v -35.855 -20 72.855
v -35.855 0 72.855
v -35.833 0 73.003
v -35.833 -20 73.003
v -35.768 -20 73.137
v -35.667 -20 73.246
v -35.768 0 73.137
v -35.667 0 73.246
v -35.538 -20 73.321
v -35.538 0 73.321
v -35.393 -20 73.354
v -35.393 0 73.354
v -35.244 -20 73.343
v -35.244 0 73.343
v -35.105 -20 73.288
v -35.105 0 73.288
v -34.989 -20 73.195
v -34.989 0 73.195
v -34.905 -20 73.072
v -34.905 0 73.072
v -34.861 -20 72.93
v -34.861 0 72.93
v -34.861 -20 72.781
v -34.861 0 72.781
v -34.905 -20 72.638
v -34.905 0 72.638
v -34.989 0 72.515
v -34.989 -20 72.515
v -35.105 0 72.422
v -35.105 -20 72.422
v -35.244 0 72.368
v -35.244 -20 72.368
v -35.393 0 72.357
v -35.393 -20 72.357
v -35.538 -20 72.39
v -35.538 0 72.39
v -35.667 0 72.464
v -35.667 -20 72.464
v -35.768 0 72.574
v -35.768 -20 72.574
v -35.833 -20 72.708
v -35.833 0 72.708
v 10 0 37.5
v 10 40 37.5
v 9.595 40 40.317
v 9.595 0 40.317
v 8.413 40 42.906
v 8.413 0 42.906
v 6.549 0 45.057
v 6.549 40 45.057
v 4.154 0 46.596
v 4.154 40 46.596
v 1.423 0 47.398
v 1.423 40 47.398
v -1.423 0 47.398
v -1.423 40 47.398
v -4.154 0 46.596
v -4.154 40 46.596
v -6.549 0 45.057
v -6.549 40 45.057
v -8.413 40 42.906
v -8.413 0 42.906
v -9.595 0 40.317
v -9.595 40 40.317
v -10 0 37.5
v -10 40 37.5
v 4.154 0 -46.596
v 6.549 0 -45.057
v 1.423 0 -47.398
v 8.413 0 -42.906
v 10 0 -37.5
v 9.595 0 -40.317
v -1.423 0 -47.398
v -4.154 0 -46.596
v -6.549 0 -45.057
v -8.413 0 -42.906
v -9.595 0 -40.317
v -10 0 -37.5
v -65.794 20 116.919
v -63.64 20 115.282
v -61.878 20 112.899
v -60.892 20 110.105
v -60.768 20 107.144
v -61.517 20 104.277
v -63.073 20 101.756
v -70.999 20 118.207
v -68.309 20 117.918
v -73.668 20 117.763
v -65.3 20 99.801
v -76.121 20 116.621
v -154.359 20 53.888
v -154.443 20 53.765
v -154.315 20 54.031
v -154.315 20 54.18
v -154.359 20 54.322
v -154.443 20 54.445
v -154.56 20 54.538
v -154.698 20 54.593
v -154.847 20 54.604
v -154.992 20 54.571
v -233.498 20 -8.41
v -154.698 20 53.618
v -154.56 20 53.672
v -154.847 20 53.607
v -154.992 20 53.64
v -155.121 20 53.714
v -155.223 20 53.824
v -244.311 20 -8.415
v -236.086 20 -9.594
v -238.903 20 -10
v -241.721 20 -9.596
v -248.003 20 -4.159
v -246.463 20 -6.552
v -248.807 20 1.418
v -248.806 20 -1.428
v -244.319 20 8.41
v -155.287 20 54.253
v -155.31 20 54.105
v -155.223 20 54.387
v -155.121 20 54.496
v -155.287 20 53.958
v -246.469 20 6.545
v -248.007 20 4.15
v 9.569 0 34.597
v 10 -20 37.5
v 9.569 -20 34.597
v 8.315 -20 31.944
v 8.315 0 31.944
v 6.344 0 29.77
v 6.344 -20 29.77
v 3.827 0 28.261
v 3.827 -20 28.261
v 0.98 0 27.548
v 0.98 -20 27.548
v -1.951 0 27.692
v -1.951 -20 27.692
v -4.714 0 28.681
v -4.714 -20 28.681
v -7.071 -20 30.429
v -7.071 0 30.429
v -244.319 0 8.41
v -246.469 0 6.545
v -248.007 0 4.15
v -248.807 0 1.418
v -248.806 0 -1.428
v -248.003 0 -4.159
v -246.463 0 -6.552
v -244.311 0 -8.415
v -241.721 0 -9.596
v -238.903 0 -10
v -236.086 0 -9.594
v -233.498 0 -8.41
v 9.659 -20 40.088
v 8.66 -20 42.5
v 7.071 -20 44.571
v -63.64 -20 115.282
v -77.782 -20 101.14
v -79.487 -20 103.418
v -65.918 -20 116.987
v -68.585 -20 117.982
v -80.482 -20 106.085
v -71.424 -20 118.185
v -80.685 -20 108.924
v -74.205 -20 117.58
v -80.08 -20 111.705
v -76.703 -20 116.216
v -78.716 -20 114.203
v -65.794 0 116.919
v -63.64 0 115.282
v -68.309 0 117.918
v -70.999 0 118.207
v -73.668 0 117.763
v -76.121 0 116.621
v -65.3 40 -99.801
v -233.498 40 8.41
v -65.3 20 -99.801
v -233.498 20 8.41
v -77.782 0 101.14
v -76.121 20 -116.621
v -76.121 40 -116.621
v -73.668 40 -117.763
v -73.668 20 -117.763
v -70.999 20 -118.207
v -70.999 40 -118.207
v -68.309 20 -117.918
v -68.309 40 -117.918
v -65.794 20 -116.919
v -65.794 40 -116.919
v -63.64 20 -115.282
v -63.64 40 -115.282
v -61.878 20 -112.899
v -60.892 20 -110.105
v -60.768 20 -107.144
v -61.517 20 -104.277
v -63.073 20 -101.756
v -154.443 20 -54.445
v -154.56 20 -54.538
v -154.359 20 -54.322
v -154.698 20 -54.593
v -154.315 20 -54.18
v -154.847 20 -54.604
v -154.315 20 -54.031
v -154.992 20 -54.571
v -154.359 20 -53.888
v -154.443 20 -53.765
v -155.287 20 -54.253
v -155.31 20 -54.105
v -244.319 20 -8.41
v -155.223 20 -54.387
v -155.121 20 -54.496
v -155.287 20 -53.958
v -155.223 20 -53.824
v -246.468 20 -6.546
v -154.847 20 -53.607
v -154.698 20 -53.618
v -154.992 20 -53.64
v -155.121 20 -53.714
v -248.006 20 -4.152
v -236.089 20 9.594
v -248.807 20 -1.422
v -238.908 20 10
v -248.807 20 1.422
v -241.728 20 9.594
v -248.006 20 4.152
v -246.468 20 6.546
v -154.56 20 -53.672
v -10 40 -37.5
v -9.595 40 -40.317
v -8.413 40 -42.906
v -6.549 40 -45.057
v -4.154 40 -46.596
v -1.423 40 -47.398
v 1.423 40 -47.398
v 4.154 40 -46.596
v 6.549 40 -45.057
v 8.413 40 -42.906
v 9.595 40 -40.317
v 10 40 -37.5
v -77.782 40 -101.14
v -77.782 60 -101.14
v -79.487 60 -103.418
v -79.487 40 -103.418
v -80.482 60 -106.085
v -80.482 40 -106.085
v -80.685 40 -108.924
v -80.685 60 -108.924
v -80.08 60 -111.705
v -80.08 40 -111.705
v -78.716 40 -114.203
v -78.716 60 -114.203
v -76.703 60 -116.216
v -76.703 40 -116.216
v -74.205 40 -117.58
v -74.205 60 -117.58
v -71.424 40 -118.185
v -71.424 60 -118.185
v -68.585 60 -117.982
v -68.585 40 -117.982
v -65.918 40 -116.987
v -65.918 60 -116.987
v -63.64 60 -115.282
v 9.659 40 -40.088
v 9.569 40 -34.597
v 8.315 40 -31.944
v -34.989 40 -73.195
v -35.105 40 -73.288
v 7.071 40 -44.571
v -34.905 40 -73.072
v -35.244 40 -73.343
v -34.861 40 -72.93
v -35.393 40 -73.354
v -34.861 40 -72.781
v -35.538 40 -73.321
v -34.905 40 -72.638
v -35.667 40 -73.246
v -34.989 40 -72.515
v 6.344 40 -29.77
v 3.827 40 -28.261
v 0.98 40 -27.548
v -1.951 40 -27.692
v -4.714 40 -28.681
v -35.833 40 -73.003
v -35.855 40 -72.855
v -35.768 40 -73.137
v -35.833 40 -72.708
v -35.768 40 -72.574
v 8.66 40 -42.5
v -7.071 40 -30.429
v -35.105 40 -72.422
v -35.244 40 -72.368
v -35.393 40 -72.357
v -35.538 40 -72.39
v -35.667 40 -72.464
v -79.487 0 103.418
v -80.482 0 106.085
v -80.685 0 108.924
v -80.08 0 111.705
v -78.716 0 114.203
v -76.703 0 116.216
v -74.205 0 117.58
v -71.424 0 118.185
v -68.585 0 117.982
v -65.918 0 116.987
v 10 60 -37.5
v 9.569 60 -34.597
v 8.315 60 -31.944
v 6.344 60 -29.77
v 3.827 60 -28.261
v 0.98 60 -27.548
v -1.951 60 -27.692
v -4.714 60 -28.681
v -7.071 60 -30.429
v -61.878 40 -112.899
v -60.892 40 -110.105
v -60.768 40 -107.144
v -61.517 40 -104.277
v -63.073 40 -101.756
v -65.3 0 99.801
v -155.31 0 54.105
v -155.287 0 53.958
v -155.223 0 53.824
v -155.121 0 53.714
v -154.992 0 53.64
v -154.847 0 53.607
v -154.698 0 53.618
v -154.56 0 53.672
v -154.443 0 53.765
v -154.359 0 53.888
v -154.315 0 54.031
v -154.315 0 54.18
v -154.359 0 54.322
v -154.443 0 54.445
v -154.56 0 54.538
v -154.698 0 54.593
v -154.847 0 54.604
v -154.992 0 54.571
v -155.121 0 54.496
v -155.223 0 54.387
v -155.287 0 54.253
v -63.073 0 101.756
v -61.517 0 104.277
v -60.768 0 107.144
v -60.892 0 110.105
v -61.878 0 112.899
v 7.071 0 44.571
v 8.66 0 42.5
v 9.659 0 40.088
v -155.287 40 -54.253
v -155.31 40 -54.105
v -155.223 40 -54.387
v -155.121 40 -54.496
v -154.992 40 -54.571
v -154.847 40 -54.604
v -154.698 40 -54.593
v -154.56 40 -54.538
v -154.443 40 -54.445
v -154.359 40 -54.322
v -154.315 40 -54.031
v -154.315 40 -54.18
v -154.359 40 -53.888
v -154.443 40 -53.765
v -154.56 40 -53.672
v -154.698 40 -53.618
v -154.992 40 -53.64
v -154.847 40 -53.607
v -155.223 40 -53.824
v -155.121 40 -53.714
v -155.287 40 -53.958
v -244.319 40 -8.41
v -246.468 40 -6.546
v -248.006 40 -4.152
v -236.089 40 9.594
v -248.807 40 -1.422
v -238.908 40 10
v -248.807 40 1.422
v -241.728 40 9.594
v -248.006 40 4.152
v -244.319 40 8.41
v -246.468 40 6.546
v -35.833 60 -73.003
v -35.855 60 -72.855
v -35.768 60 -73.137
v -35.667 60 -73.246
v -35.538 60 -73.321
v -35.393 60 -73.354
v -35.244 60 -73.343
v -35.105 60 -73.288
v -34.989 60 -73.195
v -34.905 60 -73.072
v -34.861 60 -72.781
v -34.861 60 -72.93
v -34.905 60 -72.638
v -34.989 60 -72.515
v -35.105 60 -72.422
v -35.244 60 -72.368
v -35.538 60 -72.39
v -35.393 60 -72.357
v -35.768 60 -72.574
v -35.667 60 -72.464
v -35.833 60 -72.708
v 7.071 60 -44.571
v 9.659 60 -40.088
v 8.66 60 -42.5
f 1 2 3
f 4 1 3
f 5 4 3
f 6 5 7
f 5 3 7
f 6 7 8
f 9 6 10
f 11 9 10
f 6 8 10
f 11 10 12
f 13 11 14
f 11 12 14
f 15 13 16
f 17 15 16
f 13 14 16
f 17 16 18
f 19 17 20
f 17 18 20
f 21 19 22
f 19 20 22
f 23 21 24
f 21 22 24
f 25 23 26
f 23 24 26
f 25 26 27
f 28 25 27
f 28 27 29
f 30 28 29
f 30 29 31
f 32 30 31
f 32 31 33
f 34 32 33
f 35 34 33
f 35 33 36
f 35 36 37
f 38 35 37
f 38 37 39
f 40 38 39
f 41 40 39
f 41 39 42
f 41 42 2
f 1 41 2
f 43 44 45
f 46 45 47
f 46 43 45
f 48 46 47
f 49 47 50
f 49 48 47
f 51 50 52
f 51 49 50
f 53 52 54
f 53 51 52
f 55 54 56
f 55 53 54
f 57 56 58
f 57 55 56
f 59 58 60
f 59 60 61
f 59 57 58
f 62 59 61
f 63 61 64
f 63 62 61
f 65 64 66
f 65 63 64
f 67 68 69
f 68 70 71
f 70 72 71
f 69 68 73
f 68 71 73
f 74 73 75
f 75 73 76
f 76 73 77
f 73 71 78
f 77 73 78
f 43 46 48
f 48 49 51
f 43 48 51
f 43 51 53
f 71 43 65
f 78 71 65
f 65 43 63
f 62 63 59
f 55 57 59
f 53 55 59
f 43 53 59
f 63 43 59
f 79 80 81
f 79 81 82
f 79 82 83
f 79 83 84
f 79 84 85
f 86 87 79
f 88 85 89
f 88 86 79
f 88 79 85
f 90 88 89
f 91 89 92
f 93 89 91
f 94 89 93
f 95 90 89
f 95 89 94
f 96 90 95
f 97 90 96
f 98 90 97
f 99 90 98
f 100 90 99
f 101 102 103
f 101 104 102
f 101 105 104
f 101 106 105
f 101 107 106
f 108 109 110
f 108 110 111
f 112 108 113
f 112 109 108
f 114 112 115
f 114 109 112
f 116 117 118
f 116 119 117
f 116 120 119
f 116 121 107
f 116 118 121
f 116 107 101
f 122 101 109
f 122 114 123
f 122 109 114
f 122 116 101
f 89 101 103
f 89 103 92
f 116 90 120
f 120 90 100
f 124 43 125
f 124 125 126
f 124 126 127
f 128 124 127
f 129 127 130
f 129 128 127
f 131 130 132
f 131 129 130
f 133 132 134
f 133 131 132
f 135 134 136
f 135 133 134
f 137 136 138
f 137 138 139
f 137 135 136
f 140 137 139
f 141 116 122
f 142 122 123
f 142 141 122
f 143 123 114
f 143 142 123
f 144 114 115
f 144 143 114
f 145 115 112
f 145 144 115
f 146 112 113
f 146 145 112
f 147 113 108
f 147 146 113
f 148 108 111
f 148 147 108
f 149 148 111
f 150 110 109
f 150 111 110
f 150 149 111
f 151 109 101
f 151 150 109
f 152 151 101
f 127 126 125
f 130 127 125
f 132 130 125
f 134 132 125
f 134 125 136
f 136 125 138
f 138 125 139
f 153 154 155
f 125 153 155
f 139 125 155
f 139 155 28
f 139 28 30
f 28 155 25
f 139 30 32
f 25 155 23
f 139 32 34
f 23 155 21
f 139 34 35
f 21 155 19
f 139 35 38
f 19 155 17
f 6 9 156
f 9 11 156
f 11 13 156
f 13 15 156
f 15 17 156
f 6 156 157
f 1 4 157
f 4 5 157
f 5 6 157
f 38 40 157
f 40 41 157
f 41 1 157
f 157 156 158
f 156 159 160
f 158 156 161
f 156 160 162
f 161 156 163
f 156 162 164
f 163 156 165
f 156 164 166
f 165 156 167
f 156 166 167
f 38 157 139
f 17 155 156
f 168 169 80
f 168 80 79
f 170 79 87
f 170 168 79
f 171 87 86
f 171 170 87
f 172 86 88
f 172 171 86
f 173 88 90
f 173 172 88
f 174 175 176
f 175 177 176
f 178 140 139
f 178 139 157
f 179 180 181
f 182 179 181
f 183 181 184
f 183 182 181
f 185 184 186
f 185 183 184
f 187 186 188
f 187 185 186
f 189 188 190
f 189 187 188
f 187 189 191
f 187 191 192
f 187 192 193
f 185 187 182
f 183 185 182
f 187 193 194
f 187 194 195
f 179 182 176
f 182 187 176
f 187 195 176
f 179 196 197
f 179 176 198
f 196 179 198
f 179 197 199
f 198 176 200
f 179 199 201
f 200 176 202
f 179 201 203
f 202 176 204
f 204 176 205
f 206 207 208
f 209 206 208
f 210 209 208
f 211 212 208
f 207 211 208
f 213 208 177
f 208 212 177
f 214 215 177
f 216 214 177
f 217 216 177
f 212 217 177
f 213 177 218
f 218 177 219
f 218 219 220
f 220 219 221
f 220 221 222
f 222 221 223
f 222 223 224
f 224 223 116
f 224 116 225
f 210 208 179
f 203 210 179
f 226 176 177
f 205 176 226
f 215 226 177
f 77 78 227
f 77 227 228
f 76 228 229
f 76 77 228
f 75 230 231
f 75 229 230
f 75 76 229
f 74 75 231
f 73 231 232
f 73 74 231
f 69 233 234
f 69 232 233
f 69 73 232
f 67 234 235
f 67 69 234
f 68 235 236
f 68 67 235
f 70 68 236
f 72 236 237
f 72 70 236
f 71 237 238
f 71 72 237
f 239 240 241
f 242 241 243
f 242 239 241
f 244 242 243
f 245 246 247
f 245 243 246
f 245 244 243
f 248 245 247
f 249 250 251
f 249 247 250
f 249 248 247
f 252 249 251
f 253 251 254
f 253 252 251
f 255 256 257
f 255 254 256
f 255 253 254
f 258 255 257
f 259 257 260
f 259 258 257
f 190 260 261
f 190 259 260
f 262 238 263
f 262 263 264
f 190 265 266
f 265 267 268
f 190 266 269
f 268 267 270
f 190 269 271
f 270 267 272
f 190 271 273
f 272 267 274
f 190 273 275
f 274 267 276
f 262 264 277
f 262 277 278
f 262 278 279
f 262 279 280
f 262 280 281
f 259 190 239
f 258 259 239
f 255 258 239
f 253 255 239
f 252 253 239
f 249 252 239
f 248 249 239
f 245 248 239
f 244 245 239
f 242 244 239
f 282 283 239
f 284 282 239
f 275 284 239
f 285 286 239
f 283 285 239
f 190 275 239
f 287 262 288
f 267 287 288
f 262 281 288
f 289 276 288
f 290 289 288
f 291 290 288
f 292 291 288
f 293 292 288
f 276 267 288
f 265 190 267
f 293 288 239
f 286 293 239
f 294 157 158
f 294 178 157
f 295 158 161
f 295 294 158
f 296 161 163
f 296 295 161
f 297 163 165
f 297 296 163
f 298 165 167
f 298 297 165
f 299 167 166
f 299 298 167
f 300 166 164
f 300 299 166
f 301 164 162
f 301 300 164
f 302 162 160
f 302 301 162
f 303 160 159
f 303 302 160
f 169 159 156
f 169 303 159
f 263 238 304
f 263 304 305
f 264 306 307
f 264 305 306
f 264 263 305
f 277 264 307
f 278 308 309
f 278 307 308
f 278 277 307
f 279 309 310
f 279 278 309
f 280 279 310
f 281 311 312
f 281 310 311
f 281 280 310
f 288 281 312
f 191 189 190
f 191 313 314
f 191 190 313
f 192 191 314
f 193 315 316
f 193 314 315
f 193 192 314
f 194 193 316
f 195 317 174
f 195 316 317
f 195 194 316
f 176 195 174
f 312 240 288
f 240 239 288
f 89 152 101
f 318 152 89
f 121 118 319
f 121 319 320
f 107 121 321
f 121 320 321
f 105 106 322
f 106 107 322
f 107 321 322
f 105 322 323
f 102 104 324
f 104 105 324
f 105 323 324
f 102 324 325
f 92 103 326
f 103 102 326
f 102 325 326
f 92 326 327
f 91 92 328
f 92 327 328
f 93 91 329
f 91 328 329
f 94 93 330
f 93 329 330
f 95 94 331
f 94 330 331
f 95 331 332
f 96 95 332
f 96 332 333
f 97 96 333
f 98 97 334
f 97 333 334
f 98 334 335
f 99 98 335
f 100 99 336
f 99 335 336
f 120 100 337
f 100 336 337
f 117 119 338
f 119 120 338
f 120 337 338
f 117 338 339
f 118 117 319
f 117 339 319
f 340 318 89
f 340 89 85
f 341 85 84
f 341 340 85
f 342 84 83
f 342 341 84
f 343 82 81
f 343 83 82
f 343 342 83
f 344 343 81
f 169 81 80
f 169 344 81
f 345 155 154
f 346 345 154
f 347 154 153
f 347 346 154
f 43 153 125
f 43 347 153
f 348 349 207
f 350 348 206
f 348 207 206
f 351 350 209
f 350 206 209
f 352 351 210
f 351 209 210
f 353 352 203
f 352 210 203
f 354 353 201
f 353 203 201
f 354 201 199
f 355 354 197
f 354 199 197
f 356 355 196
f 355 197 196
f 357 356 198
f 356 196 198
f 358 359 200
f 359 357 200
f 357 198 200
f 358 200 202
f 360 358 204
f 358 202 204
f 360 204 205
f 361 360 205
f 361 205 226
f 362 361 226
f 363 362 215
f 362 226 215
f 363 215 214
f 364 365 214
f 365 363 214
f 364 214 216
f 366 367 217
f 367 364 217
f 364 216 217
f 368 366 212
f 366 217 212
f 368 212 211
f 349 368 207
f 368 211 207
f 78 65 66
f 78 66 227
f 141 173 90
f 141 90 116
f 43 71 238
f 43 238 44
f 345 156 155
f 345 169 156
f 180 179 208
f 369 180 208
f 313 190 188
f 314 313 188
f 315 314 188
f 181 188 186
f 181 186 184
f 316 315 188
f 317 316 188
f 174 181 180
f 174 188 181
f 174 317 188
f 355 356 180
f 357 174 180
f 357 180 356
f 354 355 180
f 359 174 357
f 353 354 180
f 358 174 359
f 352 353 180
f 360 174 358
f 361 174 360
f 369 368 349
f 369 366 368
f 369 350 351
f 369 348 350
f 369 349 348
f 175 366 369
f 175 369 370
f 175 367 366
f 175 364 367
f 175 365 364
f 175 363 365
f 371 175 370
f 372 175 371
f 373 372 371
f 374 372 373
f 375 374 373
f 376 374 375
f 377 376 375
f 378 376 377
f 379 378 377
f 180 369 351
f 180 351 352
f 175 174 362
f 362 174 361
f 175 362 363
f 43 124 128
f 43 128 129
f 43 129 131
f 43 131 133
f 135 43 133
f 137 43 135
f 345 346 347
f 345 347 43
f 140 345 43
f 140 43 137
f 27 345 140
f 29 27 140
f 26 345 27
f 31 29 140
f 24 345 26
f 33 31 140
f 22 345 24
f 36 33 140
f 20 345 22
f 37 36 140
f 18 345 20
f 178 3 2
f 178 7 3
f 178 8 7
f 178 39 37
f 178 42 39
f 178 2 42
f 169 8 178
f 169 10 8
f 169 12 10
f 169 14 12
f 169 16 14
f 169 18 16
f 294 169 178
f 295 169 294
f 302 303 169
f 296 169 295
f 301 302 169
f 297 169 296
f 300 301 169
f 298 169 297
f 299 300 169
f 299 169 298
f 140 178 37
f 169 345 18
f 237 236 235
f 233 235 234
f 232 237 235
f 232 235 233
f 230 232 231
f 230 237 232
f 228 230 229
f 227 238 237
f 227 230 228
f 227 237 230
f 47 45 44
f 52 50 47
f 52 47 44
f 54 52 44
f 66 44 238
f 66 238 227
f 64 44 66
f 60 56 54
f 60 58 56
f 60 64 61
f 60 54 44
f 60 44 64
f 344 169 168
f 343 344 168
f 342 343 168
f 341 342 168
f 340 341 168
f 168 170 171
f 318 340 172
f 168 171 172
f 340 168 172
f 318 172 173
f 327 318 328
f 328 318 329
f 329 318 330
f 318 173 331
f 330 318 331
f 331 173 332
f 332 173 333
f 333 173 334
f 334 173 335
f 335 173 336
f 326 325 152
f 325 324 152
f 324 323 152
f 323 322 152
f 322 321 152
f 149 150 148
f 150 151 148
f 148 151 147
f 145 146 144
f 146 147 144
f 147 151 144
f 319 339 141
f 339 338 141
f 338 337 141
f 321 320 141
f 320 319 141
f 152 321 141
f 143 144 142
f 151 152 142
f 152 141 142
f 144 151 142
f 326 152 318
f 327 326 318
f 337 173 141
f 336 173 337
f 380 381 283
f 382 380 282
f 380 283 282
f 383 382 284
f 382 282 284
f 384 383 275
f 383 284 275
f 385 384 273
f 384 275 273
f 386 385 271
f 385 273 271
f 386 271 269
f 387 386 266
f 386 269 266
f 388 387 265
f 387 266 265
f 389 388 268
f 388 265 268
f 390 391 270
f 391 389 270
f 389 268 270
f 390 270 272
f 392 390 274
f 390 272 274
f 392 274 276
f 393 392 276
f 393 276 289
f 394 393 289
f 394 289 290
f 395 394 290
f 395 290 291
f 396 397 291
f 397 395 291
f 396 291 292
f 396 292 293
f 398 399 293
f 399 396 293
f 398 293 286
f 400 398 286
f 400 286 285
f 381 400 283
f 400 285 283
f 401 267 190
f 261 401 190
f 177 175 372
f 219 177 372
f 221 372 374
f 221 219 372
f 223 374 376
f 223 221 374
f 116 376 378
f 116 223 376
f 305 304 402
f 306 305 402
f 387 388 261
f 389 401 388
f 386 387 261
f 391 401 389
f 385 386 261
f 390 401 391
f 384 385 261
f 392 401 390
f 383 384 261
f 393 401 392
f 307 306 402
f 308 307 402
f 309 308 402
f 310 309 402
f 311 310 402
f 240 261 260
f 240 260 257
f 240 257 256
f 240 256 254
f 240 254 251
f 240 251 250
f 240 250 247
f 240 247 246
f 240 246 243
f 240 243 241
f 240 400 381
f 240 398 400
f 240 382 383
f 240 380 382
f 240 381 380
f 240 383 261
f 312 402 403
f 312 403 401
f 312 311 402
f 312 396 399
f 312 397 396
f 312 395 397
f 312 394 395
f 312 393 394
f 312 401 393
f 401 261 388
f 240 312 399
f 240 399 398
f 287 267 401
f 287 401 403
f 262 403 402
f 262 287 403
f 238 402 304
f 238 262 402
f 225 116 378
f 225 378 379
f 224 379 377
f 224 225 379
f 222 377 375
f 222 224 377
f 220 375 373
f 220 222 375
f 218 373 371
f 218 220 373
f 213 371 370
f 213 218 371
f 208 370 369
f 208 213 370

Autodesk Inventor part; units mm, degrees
ref_plane "YZ Plane" through (0, 0, 0) normal (1, 0, 0) x (0, 1, 0)
ref_plane "XZ Plane" through (0, 0, 0) normal (0, 1, 0) x (-1, 0, 0)
ref_plane "XY Plane" through (0, 0, 0) normal (0, 0, 1) x (1, 0, 0)
sketch "Sketch1" plane through (0, 0, 0) normal (0, 1, 0) x (-1, 0, 0)
  line L0 (1000, 500) -> (0, 500) construction
  line L1 (0, 500) -> (0, -500) construction
  line L2 (0, -500) -> (1000, -500) construction
  line L3 (1000, -500) -> (1000, 500) construction
  line L4 (0, 37.5) -> (0, -37.5) construction
  line L5 (10, 37.5) -> (10, -37.5)
  line L6 (-10, -37.5) -> (-10, 37.5)
  arc A0 (10, 37.5) -> (-10, 37.5) centre (0, 37.5) ccw
  arc A1 (-10, -37.5) -> (10, -37.5) centre (0, -37.5) ccw
  line L7 (70.7107, 108.2107) -> (0, 37.5) construction
  line L8 (63.6396, 115.2817) -> (-7.0711, 44.5711)
  line L9 (7.0711, 30.4289) -> (77.7817, 101.1396)
  arc A2 (77.7817, 101.1396) -> (63.6396, 115.2817) centre (70.7107, 108.2107) ccw
  arc A3 (-7.0711, 44.5711) -> (7.0711, 30.4289) centre (0, 37.5) ccw
  line L10 (70.7107, -108.2107) -> (0, -37.5) construction
  line L11 (77.7817, -101.1396) -> (7.0711, -30.4289)
  line L12 (-7.0711, -44.5711) -> (63.6396, -115.2817)
  arc A4 (63.6396, -115.2817) -> (77.7817, -101.1396) centre (70.7107, -108.2107) ccw
  arc A5 (7.0711, -30.4289) -> (-7.0711, -44.5711) centre (0, -37.5) ccw
  line L13 (70.7107, 108.2107) -> (238.9083, 0) construction
  line L14 (76.1212, 116.6206) -> (244.3189, 8.4099)
  line L15 (233.4978, -8.4099) -> (65.3001, 99.8008)
  arc A6 (76.1212, 116.6206) -> (65.3001, 99.8008) centre (70.7107, 108.2107) ccw
  arc A7 (233.4978, -8.4099) -> (244.3189, 8.4099) centre (238.9083, 0) ccw
  line L16 (70.7107, -108.2107) -> (238.9083, 0) construction
  line L17 (76.1212, -116.6206) -> (244.3189, -8.4099)
  line L18 (233.4978, 8.4099) -> (65.3001, -99.8008)
  arc A8 (65.3001, -99.8008) -> (76.1212, -116.6206) centre (70.7107, -108.2107) ccw
  arc A9 (244.3189, -8.4099) -> (233.4978, 8.4099) centre (238.9083, 0) ccw
  line L19 (70.7107, -108.2107) -> (70.7107, -536.9645) construction
  line L20 (70.7107, 108.2107) -> (70.7107, -95.8947) construction
  circle A10 centre (154.8095, 54.1053) radius 0.5
  circle A11 centre (154.8095, -54.1053) radius 0.5
  circle A12 centre (35.3553, -72.8553) radius 0.5
  circle A13 centre (35.3553, 72.8553) radius 0.5
  point P0 (0, 0)
  point P1 (0, 0)
  point P2 (0, 0)
  point P3 (-7.0711, 44.5711)
  point P4 (-10, 37.5)
  point P5 (63.6396, -115.2817)
  point P6 (76.1212, -116.6206)
  point P7 (244.3189, -8.4099)
  point P8 (244.3189, 8.4099)
  point P9 (76.1212, 116.6206)
  point P10 (63.6396, 115.2817)
  point P11 (-7.0711, -44.5711)
  dimension "d42" = 1000
  dimension "d43" = 1000
  dimension "d45" = 75
  dimension "d46" = 20
  dimension "d47" = 20
  dimension "d48" = 20
  dimension "d49" = 20
  dimension "d50" = 20
  dimension "d51" = 100
  dimension "d52" = 100
  dimension "d53" = 200
  dimension "d54" = 200
  dimension "d55" = 45
  dimension "d56" = 45
  dimension "d71" = 122.755
  dimension "d72" = 57.245
  dimension "d73" = 154.8095
  dimension "d74" = 54.1053
  dimension "d75" = 35.3553
  dimension "d76" = 72.8553
  dimension "d77" = 77.755
  dimension "d78" = 37.5
  dimension "d79" = 35.36
  dimension "d80" = 1
extrude "Extrusion6" add sketch "Sketch1" against normal blind 20 contours A0 L8 A6 L15 L9 L5 | L5 L9 A3 A0 | L15 A6 A2 L9
extrude "Extrusion7" add sketch "Sketch1" along normal blind 20 separate body contours L15 A6 A2 L9 | L9 A2 L14 A9 L18 L15 | L18 A9 A7 L15
extrude "Extrusion8" add sketch "Sketch1" along normal blind 40 separate body contours L18 L15 A7 L17 A4 L11 | L11 A4 A8 L18 | L18 A9 A7 L15
extrude "Extrusion9" add sketch "Sketch1" along normal blind 60 separate body contours L11 L18 A8 L12 A1 L5 | L5 A1 A5 L11 | L11 A4 A8 L18
extrude "Extrusion10" cut sketch "Sketch1" along normal blind 20 contours L18 L15 A7 L17 A4 L11 | L11 A4 A8 L18 | L18 A9 A7 L15 | A11 bodies 3
extrude "Extrusion11" cut sketch "Sketch1" along normal blind 40 contours L11 L18 A8 L12 A1 L5 | L5 A1 A5 L11 | L11 A4 A8 L18 | A12 bodies 4
extrude "Extrusion12" add sketch "Sketch1" along normal blind 40 separate body contours L5 L9 A3 A0 | L5 L11 A5 L6 A3 L9 | L5 A1 A5 L11
equation "\"d45\" = L_G"
equation "\"d46\" = t"
equation "\"d47\" = t"
equation "\"d48\" = t"
equation "\"d49\" = t"
equation "\"d50\" = t"
equation "\"d51\" = L_P"
equation "\"d52\" = L_P"
equation "\"d53\" = L_D"
equation "\"d54\" = L_D"
equation "\"d57\" = t"
equation "\"d59\" = t"
equation "\"d61\" = 2 * t"
equation "\"d63\" = 3 * t"
equation "\"d65\" = t"
equation "\"d67\" = 2 * t"
equation "\"d69\" = 2 * t"
equation "\"L_G\" = 150 * scale"
equation "\"L_P\" = 200 * scale"
equation "\"L_D\" = 400 * scale"
equation "\"t\" = 40 * scale"
equation "\"scale\" = 0.5"
properties part number "5 Barras Simplificado"
